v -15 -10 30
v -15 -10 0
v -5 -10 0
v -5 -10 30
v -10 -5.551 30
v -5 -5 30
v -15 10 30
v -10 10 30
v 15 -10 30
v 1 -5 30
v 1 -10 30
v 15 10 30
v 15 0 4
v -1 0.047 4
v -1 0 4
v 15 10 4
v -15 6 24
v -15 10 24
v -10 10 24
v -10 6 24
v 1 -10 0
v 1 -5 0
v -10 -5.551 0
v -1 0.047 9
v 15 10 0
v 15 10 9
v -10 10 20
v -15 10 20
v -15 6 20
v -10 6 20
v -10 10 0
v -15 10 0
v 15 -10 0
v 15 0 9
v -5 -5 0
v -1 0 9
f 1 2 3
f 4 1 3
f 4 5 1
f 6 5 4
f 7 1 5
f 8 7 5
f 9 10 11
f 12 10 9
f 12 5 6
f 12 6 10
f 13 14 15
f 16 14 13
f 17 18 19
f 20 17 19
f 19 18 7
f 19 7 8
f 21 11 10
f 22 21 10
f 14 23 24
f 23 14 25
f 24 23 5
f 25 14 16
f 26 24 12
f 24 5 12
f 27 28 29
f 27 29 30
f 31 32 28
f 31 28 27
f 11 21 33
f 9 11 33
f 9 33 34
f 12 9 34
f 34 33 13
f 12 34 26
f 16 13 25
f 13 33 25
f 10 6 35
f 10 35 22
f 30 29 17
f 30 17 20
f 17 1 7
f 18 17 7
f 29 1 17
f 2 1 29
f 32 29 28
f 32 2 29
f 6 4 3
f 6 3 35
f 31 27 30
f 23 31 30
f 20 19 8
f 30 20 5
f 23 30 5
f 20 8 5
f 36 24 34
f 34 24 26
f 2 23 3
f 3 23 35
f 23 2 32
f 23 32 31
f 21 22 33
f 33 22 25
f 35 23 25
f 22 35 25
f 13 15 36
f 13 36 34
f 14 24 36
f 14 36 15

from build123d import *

# Parameters (mm, degrees)
SKETCH_1_W          = 30
SKETCH_1_H          = 20
EXTRUDE_1_DEPTH     = 30
SKETCH_2_W          = 6
SKETCH_2_H          = 5
CUT_EXTRUDE_1_DEPTH = 30
CUT_EXTRUDE_2_DEPTH = 30
SKETCH_4_W          = 5
SKETCH_4_H          = 4
CUT_EXTRUDE_3_DEPTH = 4
SKETCH_6_W          = 16
SKETCH_6_H          = 5
CUT_EXTRUDE_4_DEPTH = 10


with BuildPart() as part:
    # 草圖1 → 填料-伸長1 (new body)
    with BuildSketch(Plane.XY):
        Rectangle(SKETCH_1_W, SKETCH_1_H)
    extrude(amount=EXTRUDE_1_DEPTH)

    # 草圖2 → 除料-伸長1 (cut)
    with BuildSketch(Plane.XY.offset(30)):
        with Locations((-2, -7.5)):
            Rectangle(SKETCH_2_W, SKETCH_2_H)
    extrude(amount=-CUT_EXTRUDE_1_DEPTH, mode=Mode.SUBTRACT)

    # 草圖3 → 除料-伸長2 (cut)
    with BuildSketch(Plane.XY.offset(30)):
        Polygon((-10, 10), (-10, -5.551195207), (15, 10), align=None)
    extrude(amount=-CUT_EXTRUDE_2_DEPTH, mode=Mode.SUBTRACT)

    # 草圖4 → 除料-伸長3 (cut)
    with BuildSketch(Plane(origin=(0, 10, 0), x_dir=(1, 0, 0), z_dir=(0, 1, 0))):
        with Locations((-12.5, -22)):
            Rectangle(SKETCH_4_W, SKETCH_4_H)
    extrude(amount=-CUT_EXTRUDE_3_DEPTH, mode=Mode.SUBTRACT)

    # 草圖6 → 除料-伸長4 (cut)
    with BuildSketch(Plane(origin=(0, 10, 0), x_dir=(1, 0, 0), z_dir=(0, 1, 0))):
        with Locations((7, -6.5)):
            Rectangle(SKETCH_6_W, SKETCH_6_H)
    extrude(amount=-CUT_EXTRUDE_4_DEPTH, mode=Mode.SUBTRACT)


solid = part.part
